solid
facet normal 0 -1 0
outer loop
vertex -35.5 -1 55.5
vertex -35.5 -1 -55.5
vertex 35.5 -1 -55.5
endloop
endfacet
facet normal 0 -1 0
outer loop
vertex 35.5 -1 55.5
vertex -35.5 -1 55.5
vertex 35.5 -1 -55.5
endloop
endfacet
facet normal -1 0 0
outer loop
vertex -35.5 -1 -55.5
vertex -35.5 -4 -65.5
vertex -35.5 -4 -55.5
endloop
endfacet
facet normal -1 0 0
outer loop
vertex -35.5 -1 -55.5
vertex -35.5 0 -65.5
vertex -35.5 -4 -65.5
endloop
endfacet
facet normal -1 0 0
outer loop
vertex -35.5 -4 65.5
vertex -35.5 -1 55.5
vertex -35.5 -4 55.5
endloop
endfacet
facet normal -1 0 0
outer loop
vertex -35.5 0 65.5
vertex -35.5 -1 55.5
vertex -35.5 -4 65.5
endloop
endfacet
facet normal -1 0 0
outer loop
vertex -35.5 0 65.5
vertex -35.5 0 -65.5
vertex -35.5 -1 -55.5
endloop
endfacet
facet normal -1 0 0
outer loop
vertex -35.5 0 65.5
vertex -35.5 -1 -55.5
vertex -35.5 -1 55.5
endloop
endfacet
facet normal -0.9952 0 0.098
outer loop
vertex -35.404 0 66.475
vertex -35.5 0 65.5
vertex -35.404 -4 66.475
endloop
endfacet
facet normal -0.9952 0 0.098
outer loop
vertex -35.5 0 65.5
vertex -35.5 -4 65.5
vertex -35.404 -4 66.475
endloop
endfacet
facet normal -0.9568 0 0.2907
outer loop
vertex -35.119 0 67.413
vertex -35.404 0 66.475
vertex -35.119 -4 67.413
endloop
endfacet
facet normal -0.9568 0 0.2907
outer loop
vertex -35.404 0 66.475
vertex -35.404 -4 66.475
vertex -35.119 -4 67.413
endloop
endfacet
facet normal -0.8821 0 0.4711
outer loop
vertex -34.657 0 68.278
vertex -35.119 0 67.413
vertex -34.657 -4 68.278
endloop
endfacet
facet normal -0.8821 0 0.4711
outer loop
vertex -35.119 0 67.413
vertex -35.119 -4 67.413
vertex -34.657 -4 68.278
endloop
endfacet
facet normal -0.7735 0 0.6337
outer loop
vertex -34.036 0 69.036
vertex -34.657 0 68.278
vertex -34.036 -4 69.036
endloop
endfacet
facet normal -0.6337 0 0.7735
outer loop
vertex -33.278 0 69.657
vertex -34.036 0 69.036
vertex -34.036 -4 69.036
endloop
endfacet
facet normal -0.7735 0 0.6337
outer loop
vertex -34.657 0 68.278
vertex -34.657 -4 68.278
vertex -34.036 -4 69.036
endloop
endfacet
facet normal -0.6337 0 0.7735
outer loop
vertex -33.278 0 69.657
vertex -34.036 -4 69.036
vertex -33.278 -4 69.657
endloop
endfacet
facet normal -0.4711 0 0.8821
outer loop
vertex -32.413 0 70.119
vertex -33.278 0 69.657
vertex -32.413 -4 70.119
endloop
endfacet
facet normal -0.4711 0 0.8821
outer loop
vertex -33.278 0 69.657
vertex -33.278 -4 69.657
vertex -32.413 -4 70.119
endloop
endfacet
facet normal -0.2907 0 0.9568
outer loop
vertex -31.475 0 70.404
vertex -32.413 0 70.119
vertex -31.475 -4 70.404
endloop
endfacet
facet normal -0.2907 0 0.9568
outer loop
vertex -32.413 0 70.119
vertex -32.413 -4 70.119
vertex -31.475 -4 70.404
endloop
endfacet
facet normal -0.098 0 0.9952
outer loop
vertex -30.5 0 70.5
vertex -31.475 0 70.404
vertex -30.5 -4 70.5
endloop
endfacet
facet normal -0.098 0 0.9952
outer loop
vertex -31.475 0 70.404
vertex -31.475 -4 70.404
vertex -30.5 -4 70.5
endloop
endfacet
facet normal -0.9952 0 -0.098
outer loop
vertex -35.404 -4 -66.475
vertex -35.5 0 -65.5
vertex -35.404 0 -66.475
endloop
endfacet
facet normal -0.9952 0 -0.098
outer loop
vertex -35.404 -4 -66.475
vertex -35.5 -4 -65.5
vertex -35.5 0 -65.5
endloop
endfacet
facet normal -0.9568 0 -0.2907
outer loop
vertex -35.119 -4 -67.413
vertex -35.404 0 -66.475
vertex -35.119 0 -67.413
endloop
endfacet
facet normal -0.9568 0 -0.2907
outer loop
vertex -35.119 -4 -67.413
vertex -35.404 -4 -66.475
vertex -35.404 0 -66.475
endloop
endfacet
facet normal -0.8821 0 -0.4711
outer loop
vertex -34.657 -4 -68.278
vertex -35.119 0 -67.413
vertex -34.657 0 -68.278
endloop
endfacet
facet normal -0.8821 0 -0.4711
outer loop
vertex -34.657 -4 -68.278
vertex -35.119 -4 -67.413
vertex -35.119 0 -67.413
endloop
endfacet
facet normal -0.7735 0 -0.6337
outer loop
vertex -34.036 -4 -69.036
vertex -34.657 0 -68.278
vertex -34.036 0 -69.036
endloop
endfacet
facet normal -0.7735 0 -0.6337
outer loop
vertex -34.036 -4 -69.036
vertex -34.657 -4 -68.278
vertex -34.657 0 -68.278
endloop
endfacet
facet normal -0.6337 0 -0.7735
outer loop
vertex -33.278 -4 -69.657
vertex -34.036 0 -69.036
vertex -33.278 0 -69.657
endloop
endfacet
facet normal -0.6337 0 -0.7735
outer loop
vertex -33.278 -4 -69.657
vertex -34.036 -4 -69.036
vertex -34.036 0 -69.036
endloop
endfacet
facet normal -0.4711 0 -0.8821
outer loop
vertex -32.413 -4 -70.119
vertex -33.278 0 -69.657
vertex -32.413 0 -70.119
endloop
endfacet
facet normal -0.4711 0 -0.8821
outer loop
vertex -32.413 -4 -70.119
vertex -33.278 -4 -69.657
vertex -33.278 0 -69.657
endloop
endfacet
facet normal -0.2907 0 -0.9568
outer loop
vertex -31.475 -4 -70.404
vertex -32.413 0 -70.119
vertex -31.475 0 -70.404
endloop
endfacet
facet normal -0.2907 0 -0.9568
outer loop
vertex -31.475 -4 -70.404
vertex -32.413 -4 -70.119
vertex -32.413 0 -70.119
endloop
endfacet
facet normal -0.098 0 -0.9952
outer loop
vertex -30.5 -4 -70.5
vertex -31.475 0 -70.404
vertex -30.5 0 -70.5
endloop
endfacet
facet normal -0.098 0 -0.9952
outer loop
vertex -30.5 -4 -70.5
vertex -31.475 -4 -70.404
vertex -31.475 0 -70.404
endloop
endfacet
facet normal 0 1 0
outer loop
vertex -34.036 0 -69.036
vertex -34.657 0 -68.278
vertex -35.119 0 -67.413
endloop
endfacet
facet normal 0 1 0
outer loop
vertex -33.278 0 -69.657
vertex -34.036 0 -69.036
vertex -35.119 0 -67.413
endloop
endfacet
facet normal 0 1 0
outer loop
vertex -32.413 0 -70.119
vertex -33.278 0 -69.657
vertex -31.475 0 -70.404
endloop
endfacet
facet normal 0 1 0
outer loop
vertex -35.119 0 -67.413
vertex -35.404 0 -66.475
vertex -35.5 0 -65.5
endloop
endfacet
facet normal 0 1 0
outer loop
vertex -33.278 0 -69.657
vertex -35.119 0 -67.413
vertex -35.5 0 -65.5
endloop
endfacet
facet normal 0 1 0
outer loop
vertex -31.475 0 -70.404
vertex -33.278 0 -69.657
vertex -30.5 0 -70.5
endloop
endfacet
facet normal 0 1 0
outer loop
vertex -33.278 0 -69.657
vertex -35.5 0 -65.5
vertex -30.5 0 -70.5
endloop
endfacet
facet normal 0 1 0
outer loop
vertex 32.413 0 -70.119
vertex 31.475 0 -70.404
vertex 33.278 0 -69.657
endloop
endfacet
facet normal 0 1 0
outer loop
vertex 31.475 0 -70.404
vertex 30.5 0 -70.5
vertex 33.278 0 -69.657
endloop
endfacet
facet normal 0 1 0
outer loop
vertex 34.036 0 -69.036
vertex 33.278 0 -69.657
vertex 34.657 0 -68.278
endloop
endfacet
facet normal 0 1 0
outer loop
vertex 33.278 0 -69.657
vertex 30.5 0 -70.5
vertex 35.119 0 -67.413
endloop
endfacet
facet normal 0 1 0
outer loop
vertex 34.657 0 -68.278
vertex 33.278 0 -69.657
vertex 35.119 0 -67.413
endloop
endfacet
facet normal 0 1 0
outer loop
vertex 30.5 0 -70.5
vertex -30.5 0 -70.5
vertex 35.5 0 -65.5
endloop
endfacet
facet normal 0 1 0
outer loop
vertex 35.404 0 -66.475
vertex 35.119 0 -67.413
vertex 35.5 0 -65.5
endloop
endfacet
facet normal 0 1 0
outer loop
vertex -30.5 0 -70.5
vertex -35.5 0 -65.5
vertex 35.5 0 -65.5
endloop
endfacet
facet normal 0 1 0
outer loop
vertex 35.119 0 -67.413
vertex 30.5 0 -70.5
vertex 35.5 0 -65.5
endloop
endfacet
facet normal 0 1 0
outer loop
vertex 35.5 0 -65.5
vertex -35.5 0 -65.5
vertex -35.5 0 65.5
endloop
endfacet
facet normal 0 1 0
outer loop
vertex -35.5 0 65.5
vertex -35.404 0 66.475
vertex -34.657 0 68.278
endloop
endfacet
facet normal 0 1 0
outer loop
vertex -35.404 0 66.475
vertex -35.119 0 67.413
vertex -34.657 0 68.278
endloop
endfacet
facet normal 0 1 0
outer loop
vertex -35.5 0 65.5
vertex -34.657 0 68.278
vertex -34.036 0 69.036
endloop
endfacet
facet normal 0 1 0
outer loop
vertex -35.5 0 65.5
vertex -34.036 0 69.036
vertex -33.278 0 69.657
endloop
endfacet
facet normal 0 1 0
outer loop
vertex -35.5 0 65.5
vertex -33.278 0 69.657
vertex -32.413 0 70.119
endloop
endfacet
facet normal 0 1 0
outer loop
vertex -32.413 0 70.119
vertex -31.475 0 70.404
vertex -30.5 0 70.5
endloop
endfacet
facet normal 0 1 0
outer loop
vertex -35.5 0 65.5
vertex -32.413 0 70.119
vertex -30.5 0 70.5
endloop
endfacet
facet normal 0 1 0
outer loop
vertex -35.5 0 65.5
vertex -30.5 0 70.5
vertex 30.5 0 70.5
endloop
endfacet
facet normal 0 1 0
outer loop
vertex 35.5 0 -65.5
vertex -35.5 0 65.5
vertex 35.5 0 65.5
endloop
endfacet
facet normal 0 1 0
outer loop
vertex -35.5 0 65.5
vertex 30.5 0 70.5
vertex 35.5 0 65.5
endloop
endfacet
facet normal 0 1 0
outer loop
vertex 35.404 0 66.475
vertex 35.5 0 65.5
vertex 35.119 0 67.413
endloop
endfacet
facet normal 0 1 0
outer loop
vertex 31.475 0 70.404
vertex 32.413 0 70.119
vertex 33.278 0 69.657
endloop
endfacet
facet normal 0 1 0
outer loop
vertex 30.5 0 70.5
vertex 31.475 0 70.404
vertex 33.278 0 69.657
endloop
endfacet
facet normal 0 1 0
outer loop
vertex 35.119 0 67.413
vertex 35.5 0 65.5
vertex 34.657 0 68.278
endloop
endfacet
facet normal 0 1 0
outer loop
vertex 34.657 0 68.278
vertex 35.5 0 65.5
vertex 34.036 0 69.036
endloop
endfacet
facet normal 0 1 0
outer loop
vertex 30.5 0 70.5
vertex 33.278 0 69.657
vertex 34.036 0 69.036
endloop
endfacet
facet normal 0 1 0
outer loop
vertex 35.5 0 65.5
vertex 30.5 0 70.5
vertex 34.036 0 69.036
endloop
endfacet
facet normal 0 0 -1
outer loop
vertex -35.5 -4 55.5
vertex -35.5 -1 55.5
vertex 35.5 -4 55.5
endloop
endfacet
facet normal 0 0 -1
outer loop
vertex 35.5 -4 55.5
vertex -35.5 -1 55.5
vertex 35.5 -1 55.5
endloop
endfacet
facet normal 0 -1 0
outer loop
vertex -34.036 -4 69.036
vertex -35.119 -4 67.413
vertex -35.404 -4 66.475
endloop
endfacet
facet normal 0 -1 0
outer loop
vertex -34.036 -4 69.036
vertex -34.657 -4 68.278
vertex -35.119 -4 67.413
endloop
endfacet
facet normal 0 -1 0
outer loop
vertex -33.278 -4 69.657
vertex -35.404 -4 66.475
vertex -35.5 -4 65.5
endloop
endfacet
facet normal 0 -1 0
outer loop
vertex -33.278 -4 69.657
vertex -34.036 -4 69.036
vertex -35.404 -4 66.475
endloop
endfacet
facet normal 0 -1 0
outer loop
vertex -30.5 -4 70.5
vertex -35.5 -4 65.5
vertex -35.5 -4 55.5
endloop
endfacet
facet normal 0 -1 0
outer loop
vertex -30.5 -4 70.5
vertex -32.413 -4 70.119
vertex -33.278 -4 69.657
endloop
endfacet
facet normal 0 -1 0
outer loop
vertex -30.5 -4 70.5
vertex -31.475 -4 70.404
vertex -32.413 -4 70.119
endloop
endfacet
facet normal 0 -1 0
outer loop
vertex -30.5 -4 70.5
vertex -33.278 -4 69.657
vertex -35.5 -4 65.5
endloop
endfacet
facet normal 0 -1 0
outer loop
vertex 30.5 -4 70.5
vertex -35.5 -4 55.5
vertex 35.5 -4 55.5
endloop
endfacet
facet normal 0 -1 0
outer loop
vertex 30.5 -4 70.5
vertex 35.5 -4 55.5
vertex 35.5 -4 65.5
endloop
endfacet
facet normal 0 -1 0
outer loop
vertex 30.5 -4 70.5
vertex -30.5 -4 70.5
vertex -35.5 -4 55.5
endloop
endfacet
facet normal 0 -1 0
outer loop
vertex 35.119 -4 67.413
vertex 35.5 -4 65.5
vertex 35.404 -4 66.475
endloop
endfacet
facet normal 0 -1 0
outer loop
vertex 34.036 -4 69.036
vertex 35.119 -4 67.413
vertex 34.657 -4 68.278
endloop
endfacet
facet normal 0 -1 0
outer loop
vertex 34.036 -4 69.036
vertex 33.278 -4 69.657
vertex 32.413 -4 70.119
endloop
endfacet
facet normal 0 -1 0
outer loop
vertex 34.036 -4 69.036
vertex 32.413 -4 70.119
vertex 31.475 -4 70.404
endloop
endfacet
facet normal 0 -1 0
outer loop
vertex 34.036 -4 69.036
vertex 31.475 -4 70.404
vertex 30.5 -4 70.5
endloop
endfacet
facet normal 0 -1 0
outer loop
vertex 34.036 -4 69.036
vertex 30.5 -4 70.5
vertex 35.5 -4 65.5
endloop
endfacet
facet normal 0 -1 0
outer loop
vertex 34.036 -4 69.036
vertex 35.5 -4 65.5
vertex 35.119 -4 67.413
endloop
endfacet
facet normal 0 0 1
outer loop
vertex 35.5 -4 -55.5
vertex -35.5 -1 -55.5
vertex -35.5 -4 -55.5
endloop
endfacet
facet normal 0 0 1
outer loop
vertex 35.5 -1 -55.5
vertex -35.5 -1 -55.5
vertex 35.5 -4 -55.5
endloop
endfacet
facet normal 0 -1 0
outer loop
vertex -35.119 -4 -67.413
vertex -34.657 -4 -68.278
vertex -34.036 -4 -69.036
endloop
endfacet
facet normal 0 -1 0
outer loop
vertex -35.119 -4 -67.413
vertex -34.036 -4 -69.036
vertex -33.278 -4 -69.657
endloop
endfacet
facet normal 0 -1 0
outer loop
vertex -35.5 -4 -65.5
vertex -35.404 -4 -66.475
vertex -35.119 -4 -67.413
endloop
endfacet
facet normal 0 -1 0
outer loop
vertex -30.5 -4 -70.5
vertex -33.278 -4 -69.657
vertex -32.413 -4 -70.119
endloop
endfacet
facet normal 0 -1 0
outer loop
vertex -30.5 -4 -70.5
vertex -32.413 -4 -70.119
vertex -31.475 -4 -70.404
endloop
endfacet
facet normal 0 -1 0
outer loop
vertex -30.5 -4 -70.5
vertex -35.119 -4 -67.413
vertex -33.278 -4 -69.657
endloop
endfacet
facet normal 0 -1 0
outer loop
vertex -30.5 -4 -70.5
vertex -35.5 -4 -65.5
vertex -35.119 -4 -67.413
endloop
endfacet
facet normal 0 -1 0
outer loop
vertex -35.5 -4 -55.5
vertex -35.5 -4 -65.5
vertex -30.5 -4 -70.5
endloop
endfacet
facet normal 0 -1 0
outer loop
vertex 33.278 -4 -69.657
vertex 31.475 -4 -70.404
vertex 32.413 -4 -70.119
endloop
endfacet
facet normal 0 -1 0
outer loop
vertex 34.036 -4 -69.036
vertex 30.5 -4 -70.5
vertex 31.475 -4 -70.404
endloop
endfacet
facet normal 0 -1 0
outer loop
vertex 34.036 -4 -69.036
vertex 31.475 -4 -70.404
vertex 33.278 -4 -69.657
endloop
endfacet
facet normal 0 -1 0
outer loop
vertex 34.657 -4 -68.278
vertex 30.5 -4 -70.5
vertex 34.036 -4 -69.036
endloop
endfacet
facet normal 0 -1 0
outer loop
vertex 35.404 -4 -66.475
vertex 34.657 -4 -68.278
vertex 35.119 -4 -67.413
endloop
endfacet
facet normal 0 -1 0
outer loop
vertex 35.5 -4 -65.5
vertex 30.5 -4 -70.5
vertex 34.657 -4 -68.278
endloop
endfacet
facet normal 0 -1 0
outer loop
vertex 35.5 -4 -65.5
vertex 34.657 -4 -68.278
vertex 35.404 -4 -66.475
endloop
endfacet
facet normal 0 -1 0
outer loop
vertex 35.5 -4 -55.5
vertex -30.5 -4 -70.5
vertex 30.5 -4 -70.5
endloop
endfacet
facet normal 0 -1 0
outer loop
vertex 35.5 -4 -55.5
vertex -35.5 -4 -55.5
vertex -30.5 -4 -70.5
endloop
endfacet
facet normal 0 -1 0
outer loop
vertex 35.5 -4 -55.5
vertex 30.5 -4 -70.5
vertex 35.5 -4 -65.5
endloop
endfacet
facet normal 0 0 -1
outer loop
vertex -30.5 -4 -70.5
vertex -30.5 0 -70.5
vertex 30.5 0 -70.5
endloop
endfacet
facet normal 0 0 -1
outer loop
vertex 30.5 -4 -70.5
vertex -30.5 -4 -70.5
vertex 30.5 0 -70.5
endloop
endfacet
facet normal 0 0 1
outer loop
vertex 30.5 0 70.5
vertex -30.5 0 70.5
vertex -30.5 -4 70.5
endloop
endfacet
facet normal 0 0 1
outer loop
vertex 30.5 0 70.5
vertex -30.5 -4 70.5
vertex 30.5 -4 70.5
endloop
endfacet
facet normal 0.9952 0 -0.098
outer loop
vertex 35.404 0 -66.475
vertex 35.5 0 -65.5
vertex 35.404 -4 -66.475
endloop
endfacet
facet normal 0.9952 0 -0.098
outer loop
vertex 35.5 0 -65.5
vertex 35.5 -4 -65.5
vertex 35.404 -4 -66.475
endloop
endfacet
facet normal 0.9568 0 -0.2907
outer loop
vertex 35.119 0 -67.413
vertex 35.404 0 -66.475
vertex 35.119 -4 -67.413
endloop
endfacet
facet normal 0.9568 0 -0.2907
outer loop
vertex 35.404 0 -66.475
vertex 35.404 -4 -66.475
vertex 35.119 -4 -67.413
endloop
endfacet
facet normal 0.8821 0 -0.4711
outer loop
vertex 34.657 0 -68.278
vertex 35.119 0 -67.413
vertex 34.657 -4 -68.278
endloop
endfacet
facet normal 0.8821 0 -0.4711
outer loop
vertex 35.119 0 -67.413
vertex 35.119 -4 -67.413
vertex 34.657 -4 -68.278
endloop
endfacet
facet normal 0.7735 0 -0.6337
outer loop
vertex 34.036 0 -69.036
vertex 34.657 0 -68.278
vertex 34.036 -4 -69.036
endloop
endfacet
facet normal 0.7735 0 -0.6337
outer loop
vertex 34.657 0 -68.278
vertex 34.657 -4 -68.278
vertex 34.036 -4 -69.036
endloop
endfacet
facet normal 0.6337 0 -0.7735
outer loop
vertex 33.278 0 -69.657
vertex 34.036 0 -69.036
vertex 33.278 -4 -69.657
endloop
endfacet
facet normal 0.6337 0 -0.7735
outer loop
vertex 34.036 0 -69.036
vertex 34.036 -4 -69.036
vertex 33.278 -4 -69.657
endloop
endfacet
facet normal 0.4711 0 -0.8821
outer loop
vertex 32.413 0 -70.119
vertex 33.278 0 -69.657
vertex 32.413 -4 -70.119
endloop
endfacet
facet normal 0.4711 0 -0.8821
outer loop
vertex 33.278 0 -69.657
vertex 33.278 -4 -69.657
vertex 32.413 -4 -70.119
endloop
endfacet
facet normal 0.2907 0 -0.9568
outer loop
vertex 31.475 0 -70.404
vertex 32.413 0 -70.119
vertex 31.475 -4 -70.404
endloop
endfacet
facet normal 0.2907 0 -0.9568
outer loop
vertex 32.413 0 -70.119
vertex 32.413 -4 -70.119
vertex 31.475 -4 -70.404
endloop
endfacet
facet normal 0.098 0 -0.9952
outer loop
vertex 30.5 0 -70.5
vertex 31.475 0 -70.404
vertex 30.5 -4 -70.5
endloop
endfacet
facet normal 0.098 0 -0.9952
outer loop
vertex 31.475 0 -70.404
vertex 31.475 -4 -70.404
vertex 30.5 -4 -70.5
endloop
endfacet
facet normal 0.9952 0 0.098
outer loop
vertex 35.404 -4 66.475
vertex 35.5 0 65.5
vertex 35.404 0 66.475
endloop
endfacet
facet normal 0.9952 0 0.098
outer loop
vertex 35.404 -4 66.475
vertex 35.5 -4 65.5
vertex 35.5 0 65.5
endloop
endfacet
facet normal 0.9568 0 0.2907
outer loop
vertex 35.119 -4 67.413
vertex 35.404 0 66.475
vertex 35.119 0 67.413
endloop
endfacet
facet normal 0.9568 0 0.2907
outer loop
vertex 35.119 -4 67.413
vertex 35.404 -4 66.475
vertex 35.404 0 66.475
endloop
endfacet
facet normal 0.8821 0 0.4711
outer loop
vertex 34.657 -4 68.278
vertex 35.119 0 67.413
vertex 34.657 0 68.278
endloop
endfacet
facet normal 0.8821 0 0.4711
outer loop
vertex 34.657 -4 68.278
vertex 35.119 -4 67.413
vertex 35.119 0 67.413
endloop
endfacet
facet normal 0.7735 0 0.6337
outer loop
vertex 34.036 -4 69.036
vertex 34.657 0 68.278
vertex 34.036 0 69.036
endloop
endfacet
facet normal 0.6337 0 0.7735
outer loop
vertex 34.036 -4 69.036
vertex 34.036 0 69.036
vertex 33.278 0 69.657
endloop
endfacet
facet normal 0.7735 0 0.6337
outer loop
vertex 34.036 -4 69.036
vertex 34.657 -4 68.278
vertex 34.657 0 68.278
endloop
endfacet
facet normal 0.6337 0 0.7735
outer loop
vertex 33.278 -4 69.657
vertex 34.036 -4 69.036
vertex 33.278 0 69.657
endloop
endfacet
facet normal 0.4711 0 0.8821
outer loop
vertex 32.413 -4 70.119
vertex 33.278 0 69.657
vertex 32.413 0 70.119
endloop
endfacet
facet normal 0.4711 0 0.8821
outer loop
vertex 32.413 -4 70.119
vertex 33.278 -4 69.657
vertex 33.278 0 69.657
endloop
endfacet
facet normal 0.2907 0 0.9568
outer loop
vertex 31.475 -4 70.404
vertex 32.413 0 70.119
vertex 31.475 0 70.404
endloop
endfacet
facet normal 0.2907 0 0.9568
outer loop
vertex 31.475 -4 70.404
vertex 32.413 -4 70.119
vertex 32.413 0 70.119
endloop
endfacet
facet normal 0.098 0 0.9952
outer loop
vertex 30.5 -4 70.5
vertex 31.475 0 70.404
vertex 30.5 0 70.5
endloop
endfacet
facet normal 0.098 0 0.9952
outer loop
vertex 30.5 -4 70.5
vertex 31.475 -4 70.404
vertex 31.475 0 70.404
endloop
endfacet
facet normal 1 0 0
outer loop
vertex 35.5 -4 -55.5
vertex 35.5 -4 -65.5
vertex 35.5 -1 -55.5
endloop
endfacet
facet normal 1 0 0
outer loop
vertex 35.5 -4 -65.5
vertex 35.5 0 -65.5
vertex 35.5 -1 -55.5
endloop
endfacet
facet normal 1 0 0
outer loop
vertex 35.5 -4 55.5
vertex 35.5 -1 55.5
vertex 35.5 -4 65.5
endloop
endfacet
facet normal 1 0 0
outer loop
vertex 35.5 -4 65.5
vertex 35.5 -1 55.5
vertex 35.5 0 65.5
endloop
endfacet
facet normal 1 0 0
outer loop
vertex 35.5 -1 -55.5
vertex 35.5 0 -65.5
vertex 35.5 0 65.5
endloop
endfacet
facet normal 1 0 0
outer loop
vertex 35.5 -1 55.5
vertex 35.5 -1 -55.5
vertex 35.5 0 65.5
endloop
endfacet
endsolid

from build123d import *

# Parameters (mm, degrees)
F0_W     = 71
F0_H     = 15
F1_DEPTH = 4
F0_H_2   = 111
F2_DEPTH = 1
F3_R     = 5


with BuildPart() as f1:
    # F0 (on Front) → F1 (new body)
    with BuildSketch(Plane.XZ):
        with Locations((0, 63)):
            Rectangle(F0_W, F0_H)
        with Locations((0, -63)):
            Rectangle(F0_W, F0_H)
    extrude(amount=F1_DEPTH)

    # F0 (on Front) → F2 (join)
    with BuildSketch(Plane.XZ):
        Rectangle(F0_W, F0_H_2)
    extrude(amount=F2_DEPTH)

    # F3
    f3_edges = [f1.edges().sort_by_distance(p)[0] for p in [
        (-35.5, -2, 70.5),
        (35.5, -2, 70.5),
        (35.5, -2, -70.5),
        (-35.5, -2, -70.5),
    ]]
    fillet(f3_edges, radius=F3_R)


solid = f1.part
